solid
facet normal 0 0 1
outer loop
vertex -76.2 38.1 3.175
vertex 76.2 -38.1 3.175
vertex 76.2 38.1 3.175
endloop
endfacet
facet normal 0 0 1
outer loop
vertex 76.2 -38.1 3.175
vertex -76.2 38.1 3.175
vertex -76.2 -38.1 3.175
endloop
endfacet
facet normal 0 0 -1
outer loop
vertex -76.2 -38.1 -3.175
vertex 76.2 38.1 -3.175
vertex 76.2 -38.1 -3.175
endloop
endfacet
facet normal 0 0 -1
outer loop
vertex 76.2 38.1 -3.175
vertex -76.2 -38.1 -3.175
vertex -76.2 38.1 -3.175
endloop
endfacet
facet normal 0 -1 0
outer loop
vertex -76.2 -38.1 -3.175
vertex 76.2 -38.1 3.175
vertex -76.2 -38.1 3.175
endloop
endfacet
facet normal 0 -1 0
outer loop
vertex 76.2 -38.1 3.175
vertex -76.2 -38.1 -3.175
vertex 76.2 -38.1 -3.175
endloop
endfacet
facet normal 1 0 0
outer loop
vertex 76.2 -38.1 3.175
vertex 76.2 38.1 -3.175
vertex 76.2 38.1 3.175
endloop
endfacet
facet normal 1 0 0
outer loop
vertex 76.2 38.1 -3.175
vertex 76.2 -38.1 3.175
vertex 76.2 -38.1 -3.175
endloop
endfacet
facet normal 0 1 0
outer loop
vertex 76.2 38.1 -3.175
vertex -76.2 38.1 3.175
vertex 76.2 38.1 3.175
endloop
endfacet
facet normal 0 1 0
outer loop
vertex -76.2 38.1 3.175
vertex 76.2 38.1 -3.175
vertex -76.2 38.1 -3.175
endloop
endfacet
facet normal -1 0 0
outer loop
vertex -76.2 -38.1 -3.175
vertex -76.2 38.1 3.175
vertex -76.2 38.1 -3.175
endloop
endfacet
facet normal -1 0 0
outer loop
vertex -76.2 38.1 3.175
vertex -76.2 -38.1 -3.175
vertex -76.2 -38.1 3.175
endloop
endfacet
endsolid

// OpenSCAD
// Parameters
scale_factor = 25.4;

width = 6 * scale_factor;
depth = 3 * scale_factor;
height = .25 * scale_factor;

cube([width, depth, height], center = true);
